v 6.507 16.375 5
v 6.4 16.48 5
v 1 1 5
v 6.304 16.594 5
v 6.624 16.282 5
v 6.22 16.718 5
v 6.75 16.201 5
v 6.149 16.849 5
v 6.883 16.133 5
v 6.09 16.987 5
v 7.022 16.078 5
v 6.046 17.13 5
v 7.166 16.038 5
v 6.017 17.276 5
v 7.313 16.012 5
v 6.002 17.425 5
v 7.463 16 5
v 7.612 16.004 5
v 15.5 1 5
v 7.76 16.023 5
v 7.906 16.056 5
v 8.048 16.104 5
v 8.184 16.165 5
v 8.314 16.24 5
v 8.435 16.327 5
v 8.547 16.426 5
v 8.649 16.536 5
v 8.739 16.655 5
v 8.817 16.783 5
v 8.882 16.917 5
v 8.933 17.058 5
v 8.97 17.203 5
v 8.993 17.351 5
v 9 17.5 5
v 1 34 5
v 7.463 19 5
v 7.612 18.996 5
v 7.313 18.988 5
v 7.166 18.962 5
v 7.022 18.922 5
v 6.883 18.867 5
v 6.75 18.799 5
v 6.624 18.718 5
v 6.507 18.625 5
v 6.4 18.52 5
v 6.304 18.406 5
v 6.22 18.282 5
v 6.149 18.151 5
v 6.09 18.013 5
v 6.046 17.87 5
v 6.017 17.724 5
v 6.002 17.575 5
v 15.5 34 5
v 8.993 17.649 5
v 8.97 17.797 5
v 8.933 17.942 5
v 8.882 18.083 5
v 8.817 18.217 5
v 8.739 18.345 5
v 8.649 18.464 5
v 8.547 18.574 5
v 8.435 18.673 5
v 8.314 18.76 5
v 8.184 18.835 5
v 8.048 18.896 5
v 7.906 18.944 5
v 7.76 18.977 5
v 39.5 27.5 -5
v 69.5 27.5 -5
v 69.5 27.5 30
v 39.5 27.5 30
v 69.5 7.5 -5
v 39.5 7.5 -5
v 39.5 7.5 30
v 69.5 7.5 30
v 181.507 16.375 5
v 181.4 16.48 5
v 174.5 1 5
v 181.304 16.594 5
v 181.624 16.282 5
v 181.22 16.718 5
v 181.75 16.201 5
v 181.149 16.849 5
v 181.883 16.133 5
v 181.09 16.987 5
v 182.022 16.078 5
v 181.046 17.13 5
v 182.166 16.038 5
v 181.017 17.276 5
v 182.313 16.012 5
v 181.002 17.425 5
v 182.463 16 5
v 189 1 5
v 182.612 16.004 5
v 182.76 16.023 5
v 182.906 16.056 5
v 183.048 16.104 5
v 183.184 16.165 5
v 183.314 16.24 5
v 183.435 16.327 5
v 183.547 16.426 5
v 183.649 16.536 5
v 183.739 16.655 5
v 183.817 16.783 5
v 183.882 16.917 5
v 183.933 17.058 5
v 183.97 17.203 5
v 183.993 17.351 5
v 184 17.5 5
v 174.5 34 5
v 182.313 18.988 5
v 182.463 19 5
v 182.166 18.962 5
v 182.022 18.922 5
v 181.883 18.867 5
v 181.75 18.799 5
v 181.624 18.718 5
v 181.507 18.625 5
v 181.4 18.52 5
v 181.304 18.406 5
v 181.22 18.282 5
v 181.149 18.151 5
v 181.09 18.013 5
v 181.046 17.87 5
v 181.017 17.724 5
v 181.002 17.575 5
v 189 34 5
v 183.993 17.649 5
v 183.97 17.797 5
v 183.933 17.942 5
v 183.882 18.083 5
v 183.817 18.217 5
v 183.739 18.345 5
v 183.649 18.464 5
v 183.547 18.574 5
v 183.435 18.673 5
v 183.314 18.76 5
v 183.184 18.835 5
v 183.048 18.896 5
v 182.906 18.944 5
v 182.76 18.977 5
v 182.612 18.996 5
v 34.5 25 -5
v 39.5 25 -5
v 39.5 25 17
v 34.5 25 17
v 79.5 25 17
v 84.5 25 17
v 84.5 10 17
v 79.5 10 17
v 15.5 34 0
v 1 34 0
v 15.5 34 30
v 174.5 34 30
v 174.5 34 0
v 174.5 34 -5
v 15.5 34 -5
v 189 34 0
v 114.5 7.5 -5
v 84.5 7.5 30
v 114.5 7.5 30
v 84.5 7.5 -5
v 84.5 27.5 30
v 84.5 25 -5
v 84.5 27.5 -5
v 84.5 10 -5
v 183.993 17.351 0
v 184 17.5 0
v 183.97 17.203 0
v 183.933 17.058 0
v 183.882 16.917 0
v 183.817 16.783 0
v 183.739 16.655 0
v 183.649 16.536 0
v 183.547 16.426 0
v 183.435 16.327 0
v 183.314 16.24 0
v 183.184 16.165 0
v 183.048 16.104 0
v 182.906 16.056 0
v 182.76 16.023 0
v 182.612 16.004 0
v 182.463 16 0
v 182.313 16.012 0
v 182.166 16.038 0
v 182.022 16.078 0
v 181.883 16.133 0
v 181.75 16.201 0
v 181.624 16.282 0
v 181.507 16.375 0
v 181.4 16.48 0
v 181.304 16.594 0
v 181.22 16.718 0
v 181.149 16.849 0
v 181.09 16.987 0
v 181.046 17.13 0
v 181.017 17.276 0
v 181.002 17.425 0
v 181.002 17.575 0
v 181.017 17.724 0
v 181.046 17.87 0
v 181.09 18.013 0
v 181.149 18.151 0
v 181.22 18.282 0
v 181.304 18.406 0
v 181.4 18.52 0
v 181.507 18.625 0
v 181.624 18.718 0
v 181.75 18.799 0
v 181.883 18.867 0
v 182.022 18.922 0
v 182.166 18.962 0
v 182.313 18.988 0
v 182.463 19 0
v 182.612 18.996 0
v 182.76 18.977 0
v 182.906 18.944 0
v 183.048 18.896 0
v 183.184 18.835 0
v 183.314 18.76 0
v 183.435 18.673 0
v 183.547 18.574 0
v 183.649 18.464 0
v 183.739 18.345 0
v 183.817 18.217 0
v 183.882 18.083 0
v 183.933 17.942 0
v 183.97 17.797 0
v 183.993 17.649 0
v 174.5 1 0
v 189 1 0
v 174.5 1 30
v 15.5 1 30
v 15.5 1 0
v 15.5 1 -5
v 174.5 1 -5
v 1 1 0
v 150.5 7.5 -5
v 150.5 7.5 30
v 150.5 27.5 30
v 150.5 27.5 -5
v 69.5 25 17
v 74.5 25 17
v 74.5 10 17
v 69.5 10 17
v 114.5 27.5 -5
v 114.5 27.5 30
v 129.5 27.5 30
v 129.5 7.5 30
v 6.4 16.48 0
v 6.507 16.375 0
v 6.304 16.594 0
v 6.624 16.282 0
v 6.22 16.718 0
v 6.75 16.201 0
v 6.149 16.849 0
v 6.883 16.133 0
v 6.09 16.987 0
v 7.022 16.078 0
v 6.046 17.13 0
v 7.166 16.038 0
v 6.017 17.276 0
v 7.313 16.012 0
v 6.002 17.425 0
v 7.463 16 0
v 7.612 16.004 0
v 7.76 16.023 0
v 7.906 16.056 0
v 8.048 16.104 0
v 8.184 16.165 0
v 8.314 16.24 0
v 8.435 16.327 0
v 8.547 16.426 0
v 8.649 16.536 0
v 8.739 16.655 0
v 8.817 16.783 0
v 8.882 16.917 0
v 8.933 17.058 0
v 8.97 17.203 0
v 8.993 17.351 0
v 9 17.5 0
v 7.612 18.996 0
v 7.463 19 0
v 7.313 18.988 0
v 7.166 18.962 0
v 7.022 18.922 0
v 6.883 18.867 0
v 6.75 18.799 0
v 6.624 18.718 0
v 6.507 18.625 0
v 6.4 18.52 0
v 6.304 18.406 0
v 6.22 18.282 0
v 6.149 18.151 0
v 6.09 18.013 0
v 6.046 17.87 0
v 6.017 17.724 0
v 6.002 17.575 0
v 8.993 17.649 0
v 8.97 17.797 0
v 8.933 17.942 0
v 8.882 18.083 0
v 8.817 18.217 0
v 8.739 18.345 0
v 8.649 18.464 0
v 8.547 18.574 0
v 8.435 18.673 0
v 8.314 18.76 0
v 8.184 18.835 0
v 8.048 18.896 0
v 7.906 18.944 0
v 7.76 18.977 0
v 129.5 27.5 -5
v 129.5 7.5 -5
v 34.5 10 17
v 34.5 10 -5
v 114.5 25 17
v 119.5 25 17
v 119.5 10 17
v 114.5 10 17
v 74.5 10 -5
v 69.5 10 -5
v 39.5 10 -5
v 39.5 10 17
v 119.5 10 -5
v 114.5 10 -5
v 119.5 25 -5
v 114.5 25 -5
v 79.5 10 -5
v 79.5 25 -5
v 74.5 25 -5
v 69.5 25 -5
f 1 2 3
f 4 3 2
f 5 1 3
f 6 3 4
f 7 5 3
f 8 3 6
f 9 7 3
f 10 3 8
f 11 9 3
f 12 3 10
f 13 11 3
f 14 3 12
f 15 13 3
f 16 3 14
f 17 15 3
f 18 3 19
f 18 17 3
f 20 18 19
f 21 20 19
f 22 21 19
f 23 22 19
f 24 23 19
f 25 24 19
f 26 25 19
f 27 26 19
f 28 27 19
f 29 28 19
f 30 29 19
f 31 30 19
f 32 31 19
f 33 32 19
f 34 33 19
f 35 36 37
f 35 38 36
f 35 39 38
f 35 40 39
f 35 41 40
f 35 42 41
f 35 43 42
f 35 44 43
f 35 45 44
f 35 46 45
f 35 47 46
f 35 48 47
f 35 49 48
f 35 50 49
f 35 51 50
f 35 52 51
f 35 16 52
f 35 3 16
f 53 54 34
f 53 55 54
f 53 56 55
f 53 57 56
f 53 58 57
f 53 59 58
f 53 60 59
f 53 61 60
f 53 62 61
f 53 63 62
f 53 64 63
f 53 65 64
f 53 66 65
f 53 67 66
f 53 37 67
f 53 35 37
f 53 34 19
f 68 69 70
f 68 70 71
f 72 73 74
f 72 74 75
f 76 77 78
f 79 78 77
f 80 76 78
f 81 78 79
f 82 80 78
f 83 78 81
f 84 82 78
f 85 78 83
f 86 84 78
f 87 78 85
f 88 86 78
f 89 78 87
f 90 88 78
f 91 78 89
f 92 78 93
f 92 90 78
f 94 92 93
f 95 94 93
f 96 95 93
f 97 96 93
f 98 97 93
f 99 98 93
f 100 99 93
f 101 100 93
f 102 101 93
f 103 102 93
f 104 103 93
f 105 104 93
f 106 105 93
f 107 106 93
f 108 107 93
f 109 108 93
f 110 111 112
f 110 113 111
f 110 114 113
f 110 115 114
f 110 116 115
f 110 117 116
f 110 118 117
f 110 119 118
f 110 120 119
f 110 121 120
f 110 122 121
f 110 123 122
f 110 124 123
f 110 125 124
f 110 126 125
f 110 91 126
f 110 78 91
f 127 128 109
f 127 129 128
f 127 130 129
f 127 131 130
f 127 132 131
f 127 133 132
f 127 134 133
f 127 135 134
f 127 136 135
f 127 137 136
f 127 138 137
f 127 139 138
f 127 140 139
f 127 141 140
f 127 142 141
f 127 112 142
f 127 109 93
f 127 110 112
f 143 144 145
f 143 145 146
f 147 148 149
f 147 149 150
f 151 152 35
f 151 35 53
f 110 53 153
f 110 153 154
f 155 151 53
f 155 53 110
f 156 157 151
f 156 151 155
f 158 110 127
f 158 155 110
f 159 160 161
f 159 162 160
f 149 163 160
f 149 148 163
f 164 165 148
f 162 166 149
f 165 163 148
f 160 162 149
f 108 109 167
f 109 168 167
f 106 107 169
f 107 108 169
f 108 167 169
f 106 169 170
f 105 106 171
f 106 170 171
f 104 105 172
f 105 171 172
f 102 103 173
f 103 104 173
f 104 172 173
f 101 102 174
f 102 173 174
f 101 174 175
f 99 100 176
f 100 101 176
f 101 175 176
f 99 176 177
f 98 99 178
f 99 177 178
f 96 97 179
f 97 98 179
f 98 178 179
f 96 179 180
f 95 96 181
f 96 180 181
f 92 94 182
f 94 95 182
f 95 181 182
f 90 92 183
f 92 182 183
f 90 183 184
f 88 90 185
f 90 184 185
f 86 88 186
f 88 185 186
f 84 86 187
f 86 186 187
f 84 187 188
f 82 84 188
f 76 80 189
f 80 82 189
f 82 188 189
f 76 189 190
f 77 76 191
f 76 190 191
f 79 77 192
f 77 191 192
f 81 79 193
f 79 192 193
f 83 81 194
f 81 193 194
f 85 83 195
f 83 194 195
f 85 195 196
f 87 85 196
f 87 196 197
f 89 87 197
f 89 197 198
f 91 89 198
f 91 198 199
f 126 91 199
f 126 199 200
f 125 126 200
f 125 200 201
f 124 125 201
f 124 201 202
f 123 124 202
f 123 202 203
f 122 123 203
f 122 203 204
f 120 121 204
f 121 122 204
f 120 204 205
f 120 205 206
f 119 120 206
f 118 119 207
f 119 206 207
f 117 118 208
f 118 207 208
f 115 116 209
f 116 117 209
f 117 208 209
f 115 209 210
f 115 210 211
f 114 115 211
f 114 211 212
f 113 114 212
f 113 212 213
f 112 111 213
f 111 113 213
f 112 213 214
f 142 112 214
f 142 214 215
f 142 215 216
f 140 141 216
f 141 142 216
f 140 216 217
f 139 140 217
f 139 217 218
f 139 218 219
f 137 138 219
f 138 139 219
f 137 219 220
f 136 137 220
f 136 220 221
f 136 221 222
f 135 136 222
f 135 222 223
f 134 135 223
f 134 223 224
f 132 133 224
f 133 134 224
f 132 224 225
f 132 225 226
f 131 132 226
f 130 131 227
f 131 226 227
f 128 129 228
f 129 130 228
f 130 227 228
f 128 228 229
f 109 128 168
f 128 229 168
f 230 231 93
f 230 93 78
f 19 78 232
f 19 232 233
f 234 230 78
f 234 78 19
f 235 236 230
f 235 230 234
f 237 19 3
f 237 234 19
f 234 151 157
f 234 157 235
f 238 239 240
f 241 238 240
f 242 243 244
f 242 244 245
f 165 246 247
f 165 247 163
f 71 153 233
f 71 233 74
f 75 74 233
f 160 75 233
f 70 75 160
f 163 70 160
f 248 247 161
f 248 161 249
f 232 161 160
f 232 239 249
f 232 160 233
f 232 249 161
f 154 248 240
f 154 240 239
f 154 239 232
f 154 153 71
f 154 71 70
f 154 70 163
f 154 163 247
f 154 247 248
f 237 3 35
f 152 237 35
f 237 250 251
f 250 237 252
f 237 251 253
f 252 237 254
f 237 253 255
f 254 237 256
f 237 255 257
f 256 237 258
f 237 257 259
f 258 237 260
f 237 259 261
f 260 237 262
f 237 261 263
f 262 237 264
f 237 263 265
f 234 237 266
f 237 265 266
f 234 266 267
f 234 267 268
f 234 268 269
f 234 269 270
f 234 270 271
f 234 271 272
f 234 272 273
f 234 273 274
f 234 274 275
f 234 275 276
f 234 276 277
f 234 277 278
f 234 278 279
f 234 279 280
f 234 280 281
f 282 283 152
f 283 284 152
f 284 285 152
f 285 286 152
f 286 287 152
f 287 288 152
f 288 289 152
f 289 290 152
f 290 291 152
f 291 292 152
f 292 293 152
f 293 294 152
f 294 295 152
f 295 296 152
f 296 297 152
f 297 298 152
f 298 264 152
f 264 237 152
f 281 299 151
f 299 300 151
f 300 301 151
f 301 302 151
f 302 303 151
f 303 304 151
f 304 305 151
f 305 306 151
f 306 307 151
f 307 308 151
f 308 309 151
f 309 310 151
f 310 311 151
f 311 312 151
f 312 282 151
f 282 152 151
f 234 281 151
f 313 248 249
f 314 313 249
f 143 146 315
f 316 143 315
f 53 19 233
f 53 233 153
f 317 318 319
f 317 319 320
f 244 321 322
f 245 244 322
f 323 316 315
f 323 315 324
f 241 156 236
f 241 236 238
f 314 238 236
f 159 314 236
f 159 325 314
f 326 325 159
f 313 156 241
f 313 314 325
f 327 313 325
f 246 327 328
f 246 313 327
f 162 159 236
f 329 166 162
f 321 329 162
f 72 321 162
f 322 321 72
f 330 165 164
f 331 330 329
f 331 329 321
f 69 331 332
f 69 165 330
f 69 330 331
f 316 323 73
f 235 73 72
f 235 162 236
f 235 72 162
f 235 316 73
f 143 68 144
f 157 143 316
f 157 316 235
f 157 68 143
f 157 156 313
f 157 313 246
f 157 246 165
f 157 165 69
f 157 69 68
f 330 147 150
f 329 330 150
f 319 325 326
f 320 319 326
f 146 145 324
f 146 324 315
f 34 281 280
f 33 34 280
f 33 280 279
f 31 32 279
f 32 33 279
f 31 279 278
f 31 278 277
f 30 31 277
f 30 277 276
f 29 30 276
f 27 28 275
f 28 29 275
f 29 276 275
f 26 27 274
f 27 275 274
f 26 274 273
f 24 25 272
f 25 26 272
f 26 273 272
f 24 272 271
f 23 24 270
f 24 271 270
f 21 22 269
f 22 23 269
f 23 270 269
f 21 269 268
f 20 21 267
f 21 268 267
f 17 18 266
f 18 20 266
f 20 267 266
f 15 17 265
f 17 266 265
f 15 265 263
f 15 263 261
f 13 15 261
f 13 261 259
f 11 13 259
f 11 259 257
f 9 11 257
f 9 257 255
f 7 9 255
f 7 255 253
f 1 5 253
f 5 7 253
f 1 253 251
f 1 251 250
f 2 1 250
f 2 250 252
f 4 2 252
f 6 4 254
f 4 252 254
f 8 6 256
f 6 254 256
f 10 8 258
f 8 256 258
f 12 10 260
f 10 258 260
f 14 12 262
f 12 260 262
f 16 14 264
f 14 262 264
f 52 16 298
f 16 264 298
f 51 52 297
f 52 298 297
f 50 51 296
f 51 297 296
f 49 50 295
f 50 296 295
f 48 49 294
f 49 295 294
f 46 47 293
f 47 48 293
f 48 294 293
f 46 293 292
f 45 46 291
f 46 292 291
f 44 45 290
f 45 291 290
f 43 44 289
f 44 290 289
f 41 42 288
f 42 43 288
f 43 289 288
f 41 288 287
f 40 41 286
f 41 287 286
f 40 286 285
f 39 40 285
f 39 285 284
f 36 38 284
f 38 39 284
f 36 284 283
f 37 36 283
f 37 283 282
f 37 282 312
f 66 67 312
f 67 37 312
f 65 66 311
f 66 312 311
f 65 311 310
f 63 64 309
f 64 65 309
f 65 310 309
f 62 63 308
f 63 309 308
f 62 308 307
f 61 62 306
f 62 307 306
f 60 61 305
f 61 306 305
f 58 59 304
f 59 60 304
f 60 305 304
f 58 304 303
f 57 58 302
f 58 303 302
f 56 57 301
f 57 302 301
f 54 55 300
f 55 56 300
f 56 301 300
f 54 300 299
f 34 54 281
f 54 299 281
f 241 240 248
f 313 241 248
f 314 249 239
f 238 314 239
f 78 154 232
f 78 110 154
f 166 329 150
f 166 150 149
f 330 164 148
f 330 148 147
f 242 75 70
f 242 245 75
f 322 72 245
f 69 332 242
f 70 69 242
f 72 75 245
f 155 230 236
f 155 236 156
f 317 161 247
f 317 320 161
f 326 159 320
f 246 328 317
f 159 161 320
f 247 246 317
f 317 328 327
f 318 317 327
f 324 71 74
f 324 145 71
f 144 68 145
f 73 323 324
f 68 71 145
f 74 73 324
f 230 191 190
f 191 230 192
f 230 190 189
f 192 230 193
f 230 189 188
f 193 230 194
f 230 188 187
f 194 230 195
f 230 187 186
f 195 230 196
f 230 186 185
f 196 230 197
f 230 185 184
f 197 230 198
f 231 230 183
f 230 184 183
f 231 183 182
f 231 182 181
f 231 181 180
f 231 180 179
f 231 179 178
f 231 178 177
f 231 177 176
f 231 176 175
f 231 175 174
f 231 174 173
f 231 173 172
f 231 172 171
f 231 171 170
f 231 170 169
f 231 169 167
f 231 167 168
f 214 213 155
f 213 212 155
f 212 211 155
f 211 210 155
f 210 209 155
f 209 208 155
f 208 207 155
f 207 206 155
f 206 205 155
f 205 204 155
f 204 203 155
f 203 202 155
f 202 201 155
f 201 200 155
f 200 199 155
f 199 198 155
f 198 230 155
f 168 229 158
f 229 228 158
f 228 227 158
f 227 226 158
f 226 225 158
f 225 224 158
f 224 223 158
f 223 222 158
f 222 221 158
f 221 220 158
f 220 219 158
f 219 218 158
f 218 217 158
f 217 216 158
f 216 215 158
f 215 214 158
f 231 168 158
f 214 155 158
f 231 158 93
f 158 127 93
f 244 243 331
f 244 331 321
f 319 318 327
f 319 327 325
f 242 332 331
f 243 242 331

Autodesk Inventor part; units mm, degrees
ref_plane "YZ Plane" through (0, 0, 0) normal (1, 0, 0) x (0, 1, 0)
ref_plane "XZ Plane" through (0, 0, 0) normal (0, 1, 0) x (-1, 0, 0)
ref_plane "XY Plane" through (0, 0, 0) normal (0, 0, 1) x (1, 0, 0)
sketch "Sketch1" plane through (0, 0, 0) normal (0, 0, 1) x (1, 0, 0)
  line L0 (0, 0) -> (190, 0)
  line L1 (190, 0) -> (190, 35)
  line L2 (190, 35) -> (0, 35)
  line L3 (0, 35) -> (0, 0)
  circle A0 centre (7.5, 17.5) radius 1.5
  circle A1 centre (182.5, 17.5) radius 1.5
  point P0 (0, 17.5)
  dimension "d0" = 190
  dimension "d1" = 35
  dimension "d2" = 3
  dimension "d3" = 7.5
  dimension "d4" = 3
  dimension "d5" = 7.5
extrude "Extrusion1" add sketch "Sketch1" along normal blind 5
sketch "Sketch2" plane through (0, 0, 0) normal (0, 0, -1) x (-1, 0, 0)
  line L0 (0, 0) -> (-190, 0) projected
  line L1 (-190, 35) -> (0, 35) projected
  line L2 (-15.5, 0) -> (-174.5, 0)
  line L3 (-174.5, 0) -> (-174.5, 35)
  line L4 (-174.5, 35) -> (-15.5, 35)
  line L5 (-15.5, 35) -> (-15.5, 0)
  point P0 (-95, 0)
  dimension "d8" = 159
extrude "Extrusion2" add sketch "Sketch2" along normal blind 5
sketch "Sketch3" plane through (0, 0, 5) normal (0, 0, 1) x (1, 0, 0)
  circle A0 centre (182.5, 17.5) radius 1.5 projected
  circle A1 centre (7.5, 17.5) radius 1.5 projected
  line L0 (0, 0) -> (190, 0) projected
  line L1 (190, 0) -> (190, 35) projected
  line L2 (190, 35) -> (0, 35) projected
  line L3 (0, 35) -> (0, 0) projected
  line L4 (1, 34) -> (189, 34)
  line L5 (189, 34) -> (189, 1)
  line L6 (189, 1) -> (1, 1)
  line L7 (1, 1) -> (1, 34)
  dimension "d11" = 1
extrude "Extrusion3" cut sketch "Sketch3" against normal through all contours L3 L2 L1 L0
sketch "Sketch4" plane through (0, 0, 5) normal (0, 0, 1) x (1, 0, 0)
  line L0 (39.5, 27.5) -> (69.5, 27.5)
  line L1 (69.5, 27.5) -> (69.5, 7.5)
  line L2 (69.5, 7.5) -> (39.5, 7.5)
  line L3 (39.5, 7.5) -> (39.5, 27.5)
  line L4 (84.5, 27.5) -> (114.5, 27.5)
  line L5 (114.5, 27.5) -> (114.5, 7.5)
  line L6 (114.5, 7.5) -> (84.5, 7.5)
  line L7 (84.5, 7.5) -> (84.5, 27.5)
  line L8 (129.5, 27.5) -> (150.5, 27.5)
  line L9 (150.5, 27.5) -> (150.5, 7.5)
  line L10 (150.5, 7.5) -> (129.5, 7.5)
  line L11 (129.5, 7.5) -> (129.5, 27.5)
  line L12 (39.5, 17.5) -> (150.5, 17.5) construction
  line L13 (189, 34) -> (1, 34) projected
  circle A0 centre (7.5, 17.5) radius 1.5 projected
  point P0 (0, 0)
  point P1 (95, 17.5)
  point P2 (95, 34)
  point P3 (114.5, 17.5)
  dimension "d14" = 30
  dimension "d15" = 20
  dimension "d16" = 30
  dimension "d17" = 20
  dimension "d18" = 21
  dimension "d19" = 20
  dimension "d20" = 15
  dimension "d21" = 15
extrude "Extrusion4" cut sketch "Sketch4" against normal through all contours L0 L1 L2 L3 | L4 L5 L6 L7 | L8 L9 L10 L11
sketch "Sketch5" plane through (0, 0, 5) normal (0, 0, 1) x (1, 0, 0)
  line L0 (39.5, 27.5) -> (39.5, 7.5) projected
  line L1 (39.5, 7.5) -> (69.5, 7.5) projected
  line L2 (69.5, 7.5) -> (69.5, 27.5) projected
  line L3 (69.5, 27.5) -> (39.5, 27.5) projected
  line L4 (129.5, 27.5) -> (129.5, 7.5) projected
  line L5 (129.5, 7.5) -> (150.5, 7.5) projected
  line L6 (150.5, 7.5) -> (150.5, 27.5) projected
  line L7 (150.5, 27.5) -> (129.5, 27.5) projected
  line L8 (84.5, 27.5) -> (84.5, 7.5) projected
  line L9 (84.5, 7.5) -> (114.5, 7.5) projected
  line L10 (114.5, 7.5) -> (114.5, 27.5) projected
  line L11 (114.5, 27.5) -> (84.5, 27.5) projected
  line L12 (174.5, 1) -> (15.5, 1) projected
  line L13 (15.5, 1) -> (15.5, 34) projected
  line L14 (15.5, 34) -> (174.5, 34) projected
  line L15 (174.5, 34) -> (174.5, 1) projected
  point P0 (0, 0)
extrude "Extrusion5" add sketch "Sketch5" along normal blind 25
sketch "Sketch6" plane through (0, 0, -5) normal (0, 0, -1) x (-1, 0, 0)
  line L0 (-69.5, 27.5) -> (-39.5, 27.5) projected
  line L1 (-39.5, 27.5) -> (-39.5, 7.5) projected
  line L2 (-69.5, 7.5) -> (-69.5, 27.5) projected
  line L3 (-84.5, 27.5) -> (-84.5, 7.5) projected
  line L4 (-114.5, 27.5) -> (-84.5, 27.5) projected
  line L5 (-114.5, 7.5) -> (-114.5, 27.5) projected
  line L6 (-39.5, 25) -> (-34.5, 25)
  line L7 (-34.5, 25) -> (-34.5, 10)
  line L8 (-34.5, 10) -> (-39.5, 10)
  line L9 (-39.5, 10) -> (-39.5, 25)
  line L10 (-69.5, 25) -> (-74.5, 25)
  line L11 (-74.5, 25) -> (-74.5, 10)
  line L12 (-74.5, 10) -> (-69.5, 10)
  line L13 (-69.5, 10) -> (-69.5, 25)
  line L14 (-84.5, 25) -> (-79.5, 25)
  line L15 (-79.5, 25) -> (-79.5, 10)
  line L16 (-79.5, 10) -> (-84.5, 10)
  line L17 (-84.5, 10) -> (-84.5, 25)
  line L18 (-114.5, 25) -> (-119.5, 25)
  line L19 (-119.5, 25) -> (-119.5, 10)
  line L20 (-119.5, 10) -> (-114.5, 10)
  line L21 (-114.5, 10) -> (-114.5, 25)
  point P0 (0, 0)
  point P1 (-39.5, 17.5)
  dimension "d26" = 15
  dimension "d27" = 5
  dimension "d28" = 5
  dimension "d29" = 5
  dimension "d30" = 5
extrude "Extrusion6" cut sketch "Sketch6" against normal blind 22
properties part number "BP011" material "ABS Plastic"
